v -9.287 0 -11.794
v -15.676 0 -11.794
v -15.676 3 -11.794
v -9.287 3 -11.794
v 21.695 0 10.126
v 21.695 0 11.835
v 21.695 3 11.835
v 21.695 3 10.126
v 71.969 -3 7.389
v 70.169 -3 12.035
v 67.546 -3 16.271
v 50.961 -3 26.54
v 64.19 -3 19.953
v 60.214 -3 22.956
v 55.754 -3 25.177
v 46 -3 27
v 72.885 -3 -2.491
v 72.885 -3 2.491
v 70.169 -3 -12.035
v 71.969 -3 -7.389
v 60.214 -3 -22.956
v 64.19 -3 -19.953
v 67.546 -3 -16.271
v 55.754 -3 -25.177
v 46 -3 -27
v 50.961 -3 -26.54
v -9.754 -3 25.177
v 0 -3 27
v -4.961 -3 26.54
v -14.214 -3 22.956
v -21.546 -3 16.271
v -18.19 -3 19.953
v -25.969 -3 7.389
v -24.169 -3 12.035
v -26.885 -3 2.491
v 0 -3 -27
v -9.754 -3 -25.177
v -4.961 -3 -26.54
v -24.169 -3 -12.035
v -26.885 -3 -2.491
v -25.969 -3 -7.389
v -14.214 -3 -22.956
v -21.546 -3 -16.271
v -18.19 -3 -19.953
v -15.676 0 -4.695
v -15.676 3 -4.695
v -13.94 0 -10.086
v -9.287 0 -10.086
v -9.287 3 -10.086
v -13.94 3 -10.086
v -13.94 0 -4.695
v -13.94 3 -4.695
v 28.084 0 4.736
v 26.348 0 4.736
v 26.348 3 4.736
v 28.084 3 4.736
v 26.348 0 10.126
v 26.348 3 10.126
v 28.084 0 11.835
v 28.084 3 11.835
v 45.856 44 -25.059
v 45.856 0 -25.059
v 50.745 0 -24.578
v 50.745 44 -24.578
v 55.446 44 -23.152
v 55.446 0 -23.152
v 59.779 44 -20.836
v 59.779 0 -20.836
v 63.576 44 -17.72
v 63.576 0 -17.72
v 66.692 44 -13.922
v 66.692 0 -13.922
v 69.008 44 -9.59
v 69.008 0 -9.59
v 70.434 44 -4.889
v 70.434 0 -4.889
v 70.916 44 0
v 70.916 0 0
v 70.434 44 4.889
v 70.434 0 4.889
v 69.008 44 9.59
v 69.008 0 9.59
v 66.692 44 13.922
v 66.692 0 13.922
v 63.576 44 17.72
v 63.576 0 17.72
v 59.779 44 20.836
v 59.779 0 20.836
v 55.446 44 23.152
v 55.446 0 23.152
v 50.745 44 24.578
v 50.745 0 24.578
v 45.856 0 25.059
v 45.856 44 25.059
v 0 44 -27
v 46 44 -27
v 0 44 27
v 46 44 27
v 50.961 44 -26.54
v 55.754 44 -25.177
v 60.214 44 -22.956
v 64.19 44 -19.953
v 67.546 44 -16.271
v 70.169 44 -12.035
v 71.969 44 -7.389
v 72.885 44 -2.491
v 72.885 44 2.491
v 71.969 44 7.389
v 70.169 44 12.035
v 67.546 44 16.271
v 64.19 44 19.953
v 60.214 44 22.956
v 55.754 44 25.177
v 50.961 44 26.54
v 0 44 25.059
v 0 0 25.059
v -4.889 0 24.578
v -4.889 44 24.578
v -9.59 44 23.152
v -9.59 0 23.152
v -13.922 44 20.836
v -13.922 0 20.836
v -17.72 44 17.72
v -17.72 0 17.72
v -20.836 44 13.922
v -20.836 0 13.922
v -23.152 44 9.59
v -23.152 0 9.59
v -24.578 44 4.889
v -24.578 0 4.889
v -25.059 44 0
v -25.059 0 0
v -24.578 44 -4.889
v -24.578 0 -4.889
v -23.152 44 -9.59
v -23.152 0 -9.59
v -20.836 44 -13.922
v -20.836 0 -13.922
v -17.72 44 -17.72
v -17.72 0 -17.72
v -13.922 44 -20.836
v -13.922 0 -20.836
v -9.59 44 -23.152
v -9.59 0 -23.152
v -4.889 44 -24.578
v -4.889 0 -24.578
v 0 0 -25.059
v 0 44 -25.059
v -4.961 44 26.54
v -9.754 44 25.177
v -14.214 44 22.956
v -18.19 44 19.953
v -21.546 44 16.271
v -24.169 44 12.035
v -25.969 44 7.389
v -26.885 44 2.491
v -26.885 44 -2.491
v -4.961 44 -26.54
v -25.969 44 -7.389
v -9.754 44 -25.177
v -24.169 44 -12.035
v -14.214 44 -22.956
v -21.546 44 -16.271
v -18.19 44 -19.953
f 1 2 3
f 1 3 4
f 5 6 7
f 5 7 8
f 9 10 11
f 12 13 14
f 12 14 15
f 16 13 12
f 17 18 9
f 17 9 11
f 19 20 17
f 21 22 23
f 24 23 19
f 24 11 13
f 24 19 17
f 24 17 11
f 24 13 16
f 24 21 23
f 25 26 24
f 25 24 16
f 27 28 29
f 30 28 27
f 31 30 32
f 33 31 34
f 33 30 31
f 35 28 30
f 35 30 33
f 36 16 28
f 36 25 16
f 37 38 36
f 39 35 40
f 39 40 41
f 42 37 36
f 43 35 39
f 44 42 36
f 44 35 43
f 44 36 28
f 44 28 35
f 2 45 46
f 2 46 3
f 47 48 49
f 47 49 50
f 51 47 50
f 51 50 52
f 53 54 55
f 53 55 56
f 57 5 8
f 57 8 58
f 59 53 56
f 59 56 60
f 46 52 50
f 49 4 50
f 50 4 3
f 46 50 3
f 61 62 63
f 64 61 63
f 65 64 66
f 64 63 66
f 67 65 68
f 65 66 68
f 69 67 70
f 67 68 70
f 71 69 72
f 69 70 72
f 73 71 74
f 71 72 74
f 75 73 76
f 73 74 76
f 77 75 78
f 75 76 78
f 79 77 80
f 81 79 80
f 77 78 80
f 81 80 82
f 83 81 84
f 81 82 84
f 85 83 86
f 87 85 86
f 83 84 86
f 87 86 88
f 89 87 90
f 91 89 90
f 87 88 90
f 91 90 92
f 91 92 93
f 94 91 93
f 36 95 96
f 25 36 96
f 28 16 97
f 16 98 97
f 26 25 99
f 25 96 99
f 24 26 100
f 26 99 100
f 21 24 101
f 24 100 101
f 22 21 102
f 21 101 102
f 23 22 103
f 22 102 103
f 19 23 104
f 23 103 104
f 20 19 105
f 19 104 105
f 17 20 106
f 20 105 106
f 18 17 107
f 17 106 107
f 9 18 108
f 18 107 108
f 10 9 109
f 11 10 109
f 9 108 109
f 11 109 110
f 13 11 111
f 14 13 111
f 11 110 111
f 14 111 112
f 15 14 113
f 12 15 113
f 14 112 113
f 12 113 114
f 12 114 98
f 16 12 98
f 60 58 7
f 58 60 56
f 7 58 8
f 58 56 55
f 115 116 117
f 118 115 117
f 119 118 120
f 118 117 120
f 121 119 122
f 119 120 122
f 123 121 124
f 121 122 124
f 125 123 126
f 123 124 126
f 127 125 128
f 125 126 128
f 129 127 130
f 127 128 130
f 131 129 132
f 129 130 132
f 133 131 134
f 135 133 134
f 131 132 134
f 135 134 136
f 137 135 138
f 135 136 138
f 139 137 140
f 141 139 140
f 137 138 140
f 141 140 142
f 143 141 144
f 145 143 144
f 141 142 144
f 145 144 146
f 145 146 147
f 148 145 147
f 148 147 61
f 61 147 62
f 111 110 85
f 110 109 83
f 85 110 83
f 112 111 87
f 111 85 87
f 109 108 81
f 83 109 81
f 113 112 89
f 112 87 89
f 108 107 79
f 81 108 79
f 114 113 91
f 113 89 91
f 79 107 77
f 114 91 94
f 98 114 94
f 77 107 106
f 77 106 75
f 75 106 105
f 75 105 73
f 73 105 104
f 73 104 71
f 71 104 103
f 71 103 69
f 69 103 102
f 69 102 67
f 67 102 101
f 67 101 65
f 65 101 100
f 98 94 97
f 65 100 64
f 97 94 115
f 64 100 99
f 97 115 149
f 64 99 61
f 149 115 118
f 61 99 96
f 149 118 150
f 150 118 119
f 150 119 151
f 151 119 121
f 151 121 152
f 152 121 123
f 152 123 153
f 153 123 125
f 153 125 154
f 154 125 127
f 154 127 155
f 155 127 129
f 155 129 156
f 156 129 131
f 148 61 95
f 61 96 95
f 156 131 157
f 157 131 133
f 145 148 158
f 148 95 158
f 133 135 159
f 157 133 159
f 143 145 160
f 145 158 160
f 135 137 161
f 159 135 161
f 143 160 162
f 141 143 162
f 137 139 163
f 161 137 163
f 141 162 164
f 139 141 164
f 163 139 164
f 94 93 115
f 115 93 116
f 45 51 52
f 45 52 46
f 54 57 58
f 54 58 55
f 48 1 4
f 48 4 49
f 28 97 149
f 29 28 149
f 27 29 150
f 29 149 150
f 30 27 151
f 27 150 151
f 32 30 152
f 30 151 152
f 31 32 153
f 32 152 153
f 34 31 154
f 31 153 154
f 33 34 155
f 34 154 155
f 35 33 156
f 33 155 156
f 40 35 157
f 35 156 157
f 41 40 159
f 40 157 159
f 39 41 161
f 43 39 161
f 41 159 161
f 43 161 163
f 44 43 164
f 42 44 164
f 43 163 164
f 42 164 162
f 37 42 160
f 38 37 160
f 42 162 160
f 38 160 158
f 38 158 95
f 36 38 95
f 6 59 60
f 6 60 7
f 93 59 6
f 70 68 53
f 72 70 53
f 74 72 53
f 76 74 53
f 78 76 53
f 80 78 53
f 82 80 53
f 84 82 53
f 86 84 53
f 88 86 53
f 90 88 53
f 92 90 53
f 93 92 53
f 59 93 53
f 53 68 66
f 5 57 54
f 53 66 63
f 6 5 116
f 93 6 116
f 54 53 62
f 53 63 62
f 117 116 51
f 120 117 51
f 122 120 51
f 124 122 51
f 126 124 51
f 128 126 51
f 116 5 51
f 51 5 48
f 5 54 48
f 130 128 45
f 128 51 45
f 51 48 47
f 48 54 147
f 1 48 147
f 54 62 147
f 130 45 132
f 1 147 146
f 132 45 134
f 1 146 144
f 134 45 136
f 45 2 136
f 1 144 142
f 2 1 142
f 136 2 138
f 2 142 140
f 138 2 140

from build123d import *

# Parameters (mm, degrees)
BOSS_EXTRUDE1_DEPTH     = 44
CUT_EXTRUDE1_DEPTH      = 46
CUT_EXTRUDE1_DEPTH_BACK = 2
BOSS_EXTRUDE3_DEPTH     = 3
BOSS_EXTRUDE4_DEPTH     = 3


with BuildPart() as part:
    # Sketch2 → Boss-Extrude1 (new body)
    with BuildSketch(Plane(origin=(0, 0, 0), x_dir=(1, 0, 0), z_dir=(0, 1, 0))):
        with BuildLine():
            Line((0, 27), (46, 27))
            ThreePointArc((46, 27), (73, 0), (46, -27))
            Line((46, -27), (0, -27))
            ThreePointArc((0, -27), (-27, 0), (0, 27))
        make_face()
    extrude(amount=BOSS_EXTRUDE1_DEPTH)

    # Sketch3 → Cut-Extrude1 (cut, two sides)
    with BuildSketch(Plane(origin=(0, 0, 0), x_dir=(1, 0, 0), z_dir=(0, 1, 0))) as cut_extrude1_sk:
        with BuildLine():
            Line((0, 25.059391222), (45.856281638, 25.059391222))
            ThreePointArc((45.856281638, 25.059391222), (70.91567286, 0), (45.856281638, -25.059391222))
            Line((45.856281638, -25.059391222), (0, -25.059391222))
            ThreePointArc((0, -25.059391222), (-25.059391222, 0), (0, 25.059391222))
        make_face()
    extrude(amount=CUT_EXTRUDE1_DEPTH, mode=Mode.SUBTRACT)
    extrude(cut_extrude1_sk.sketch, amount=-CUT_EXTRUDE1_DEPTH_BACK, mode=Mode.SUBTRACT)

    # Sketch4 → Boss-Extrude3 (add)
    with BuildSketch(Plane(origin=(0, 0, 0), x_dir=(1, 0, 0), z_dir=(0, 1, 0))):
        with BuildLine():
            Line((0, 27), (46, 27))
            ThreePointArc((46, 27), (73, 0), (46, -27))
            Line((46, -27), (0, -27))
            ThreePointArc((0, -27), (-27, 0), (0, 27))
        make_face()
    extrude(amount=-BOSS_EXTRUDE3_DEPTH)

    # Sketch5 → Boss-Extrude4 (add)
    with BuildSketch(Plane(origin=(0, 0, 0), x_dir=(1, 0, 0), z_dir=(0, 1, 0))):
        Polygon((-13.939721019, 10.08564224), (-13.939721019, 4.695281904), (-15.675819956, 4.695281904), (-15.675819956, 11.794197793), (-9.286795656, 11.794197793), (-9.286795656, 10.08564224), align=None)
        Polygon((26.347826906, -10.126495255), (26.347826906, -4.736134919), (28.083925843, -4.736134919), (28.083925843, -11.835050808), (21.694901543, -11.835050808), (21.694901543, -10.126495255), align=None)
    extrude(amount=BOSS_EXTRUDE4_DEPTH)


solid = part.part
